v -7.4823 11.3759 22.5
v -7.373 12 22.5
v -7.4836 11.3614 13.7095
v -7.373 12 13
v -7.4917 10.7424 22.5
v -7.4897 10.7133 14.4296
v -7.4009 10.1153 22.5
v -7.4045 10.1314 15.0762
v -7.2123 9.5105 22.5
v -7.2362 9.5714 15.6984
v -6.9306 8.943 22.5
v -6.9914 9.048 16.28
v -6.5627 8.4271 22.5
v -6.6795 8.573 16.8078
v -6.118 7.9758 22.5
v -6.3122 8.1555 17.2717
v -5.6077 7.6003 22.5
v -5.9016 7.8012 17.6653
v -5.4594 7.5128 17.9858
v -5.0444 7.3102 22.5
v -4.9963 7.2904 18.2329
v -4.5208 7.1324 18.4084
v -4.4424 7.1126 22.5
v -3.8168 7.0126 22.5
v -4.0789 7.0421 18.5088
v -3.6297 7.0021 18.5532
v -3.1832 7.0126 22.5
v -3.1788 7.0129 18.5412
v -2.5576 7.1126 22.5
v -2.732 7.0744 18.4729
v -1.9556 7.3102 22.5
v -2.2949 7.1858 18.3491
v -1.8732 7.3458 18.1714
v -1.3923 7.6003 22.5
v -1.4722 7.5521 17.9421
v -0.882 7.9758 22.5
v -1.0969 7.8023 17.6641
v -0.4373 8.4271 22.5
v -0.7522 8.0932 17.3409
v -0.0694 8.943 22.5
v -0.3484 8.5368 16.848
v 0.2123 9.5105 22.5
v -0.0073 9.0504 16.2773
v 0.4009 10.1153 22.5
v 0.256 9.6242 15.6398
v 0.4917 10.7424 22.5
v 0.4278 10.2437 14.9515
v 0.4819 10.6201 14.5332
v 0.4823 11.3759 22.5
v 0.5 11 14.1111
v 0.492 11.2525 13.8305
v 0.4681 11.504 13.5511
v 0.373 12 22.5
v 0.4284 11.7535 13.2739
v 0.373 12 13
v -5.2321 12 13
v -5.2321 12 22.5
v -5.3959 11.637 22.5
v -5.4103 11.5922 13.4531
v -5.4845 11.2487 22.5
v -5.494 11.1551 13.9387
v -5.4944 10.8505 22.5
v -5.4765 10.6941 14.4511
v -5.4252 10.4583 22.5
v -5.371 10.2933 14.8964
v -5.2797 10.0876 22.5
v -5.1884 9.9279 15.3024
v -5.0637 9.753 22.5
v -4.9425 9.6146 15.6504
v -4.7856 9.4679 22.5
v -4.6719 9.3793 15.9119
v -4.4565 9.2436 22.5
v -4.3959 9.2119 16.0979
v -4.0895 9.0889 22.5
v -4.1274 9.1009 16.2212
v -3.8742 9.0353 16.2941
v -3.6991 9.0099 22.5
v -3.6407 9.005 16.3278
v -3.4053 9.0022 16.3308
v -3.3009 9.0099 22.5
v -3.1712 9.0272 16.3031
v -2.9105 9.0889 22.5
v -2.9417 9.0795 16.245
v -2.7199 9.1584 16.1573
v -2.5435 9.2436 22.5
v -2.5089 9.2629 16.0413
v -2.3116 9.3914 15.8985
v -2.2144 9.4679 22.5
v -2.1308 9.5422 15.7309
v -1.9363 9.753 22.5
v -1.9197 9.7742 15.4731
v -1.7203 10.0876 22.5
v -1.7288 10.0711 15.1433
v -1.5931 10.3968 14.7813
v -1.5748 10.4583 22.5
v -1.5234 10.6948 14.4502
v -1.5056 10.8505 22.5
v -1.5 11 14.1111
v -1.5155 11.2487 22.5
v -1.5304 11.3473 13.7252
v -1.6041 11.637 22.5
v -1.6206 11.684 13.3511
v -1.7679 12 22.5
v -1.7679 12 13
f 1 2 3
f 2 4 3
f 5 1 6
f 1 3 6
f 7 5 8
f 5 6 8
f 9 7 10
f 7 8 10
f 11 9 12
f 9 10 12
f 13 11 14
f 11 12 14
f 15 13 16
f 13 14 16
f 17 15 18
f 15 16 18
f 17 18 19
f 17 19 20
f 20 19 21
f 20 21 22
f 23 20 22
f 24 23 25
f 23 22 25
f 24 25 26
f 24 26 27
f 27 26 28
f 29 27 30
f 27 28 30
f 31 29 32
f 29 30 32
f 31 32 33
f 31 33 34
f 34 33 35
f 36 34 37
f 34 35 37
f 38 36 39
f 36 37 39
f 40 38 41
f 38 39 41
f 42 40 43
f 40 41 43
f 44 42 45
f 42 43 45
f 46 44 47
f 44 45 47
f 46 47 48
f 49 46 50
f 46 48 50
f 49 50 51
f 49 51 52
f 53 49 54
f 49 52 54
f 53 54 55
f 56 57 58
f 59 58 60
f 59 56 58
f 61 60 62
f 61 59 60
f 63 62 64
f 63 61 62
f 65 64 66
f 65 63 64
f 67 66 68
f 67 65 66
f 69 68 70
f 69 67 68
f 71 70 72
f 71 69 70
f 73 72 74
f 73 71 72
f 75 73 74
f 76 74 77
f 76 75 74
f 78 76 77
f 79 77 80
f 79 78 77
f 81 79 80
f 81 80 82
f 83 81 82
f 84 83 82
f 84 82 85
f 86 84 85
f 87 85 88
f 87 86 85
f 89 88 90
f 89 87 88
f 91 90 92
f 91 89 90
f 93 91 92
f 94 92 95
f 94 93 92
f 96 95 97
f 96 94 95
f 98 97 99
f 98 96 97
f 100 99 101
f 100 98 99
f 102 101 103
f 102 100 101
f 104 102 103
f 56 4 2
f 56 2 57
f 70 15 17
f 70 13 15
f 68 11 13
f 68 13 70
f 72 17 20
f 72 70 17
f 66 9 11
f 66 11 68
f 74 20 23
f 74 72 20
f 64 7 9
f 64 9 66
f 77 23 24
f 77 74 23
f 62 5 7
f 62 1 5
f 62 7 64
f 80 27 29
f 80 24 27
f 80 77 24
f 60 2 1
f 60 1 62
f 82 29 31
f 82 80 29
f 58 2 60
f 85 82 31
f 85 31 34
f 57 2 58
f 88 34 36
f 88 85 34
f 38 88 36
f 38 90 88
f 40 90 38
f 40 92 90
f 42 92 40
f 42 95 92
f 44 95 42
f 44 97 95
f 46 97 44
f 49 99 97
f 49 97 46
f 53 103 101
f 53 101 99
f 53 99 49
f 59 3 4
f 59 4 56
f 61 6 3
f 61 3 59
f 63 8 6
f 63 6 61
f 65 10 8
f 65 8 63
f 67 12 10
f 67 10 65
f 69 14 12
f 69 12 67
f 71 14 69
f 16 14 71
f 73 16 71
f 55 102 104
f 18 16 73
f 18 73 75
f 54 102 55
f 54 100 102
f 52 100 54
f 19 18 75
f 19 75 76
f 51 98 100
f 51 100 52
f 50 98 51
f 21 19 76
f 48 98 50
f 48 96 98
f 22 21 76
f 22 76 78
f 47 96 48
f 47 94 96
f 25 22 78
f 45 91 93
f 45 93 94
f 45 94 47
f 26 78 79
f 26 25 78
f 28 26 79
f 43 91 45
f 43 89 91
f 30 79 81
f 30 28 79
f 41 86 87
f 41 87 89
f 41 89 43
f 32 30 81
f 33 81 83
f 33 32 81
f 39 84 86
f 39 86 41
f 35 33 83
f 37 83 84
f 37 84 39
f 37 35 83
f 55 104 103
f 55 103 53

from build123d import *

# Parameters (mm, degrees)
BOX015_W                  = 10
BOX015_H                  = 10
BOX015_DEPTH              = 19
BOX014_W                  = 10
BOX014_H                  = 10
BOX014_DEPTH              = 19
CHAMFER023006003002_SIZE2 = 9
CHAMFER023006003002_SIZE  = 10
TUBE_R                    = 4
TUBE_R_2                  = 2
TUBE_DEPTH                = 10


with BuildPart() as cube015:
    # Box015 → Box015 (new body)
    with BuildSketch(Plane(origin=(-8.5, 12, 8.5), x_dir=(1, 0, 0), z_dir=(0, 0, 1))):
        with Locations((5, 5)):
            Rectangle(BOX015_W, BOX015_H)
    extrude(amount=BOX015_DEPTH)


with BuildPart() as chamfer023006003002:
    # Box014 → Box014 (new body)
    with BuildSketch(Plane(origin=(-10.5, 0, 0), x_dir=(1, 0, 0), z_dir=(0, 0, 1))):
        with Locations((5, 5)):
            Rectangle(BOX014_W, BOX014_H)
    extrude(amount=BOX014_DEPTH)

    # Chamfer023006003002
    chamfer023006003002_edges = [chamfer023006003002.edges().sort_by_distance(p)[0] for p in [
        (-5.5, 10, 19),
    ]]
    chamfer023006003002_side = chamfer023006003002.faces().sort_by_distance((-5.5, 10, 9.5))[0]
    chamfer(chamfer023006003002_edges, length=CHAMFER023006003002_SIZE, length2=CHAMFER023006003002_SIZE2, reference=chamfer023006003002_side)


with BuildPart() as chamfer023006003002_1:
    # Chamfer023006003002 placement: moved
    add(chamfer023006003002.part.moved(Location((2, 2, 3.5))))


with BuildPart() as cut003001018:
    # Tube → Tube (new body)
    with BuildSketch(Plane(origin=(-3.5, 11, 12), x_dir=(1, 0, 0), z_dir=(0, 0, 1))):
        Circle(TUBE_R)
        Circle(TUBE_R_2, mode=Mode.SUBTRACT)
    extrude(amount=TUBE_DEPTH)

    # Cut003001017: cut Chamfer023006003002
    add(chamfer023006003002_1.part, mode=Mode.SUBTRACT)

    # Cut003001018: cut Cube015
    add(cube015.part, mode=Mode.SUBTRACT)


with BuildPart() as cut003001018_1:
    # Cut003001018 placement: moved
    add(cut003001018.part.moved(Location((0, 0, 0.5))))


solid = cut003001018_1.part
